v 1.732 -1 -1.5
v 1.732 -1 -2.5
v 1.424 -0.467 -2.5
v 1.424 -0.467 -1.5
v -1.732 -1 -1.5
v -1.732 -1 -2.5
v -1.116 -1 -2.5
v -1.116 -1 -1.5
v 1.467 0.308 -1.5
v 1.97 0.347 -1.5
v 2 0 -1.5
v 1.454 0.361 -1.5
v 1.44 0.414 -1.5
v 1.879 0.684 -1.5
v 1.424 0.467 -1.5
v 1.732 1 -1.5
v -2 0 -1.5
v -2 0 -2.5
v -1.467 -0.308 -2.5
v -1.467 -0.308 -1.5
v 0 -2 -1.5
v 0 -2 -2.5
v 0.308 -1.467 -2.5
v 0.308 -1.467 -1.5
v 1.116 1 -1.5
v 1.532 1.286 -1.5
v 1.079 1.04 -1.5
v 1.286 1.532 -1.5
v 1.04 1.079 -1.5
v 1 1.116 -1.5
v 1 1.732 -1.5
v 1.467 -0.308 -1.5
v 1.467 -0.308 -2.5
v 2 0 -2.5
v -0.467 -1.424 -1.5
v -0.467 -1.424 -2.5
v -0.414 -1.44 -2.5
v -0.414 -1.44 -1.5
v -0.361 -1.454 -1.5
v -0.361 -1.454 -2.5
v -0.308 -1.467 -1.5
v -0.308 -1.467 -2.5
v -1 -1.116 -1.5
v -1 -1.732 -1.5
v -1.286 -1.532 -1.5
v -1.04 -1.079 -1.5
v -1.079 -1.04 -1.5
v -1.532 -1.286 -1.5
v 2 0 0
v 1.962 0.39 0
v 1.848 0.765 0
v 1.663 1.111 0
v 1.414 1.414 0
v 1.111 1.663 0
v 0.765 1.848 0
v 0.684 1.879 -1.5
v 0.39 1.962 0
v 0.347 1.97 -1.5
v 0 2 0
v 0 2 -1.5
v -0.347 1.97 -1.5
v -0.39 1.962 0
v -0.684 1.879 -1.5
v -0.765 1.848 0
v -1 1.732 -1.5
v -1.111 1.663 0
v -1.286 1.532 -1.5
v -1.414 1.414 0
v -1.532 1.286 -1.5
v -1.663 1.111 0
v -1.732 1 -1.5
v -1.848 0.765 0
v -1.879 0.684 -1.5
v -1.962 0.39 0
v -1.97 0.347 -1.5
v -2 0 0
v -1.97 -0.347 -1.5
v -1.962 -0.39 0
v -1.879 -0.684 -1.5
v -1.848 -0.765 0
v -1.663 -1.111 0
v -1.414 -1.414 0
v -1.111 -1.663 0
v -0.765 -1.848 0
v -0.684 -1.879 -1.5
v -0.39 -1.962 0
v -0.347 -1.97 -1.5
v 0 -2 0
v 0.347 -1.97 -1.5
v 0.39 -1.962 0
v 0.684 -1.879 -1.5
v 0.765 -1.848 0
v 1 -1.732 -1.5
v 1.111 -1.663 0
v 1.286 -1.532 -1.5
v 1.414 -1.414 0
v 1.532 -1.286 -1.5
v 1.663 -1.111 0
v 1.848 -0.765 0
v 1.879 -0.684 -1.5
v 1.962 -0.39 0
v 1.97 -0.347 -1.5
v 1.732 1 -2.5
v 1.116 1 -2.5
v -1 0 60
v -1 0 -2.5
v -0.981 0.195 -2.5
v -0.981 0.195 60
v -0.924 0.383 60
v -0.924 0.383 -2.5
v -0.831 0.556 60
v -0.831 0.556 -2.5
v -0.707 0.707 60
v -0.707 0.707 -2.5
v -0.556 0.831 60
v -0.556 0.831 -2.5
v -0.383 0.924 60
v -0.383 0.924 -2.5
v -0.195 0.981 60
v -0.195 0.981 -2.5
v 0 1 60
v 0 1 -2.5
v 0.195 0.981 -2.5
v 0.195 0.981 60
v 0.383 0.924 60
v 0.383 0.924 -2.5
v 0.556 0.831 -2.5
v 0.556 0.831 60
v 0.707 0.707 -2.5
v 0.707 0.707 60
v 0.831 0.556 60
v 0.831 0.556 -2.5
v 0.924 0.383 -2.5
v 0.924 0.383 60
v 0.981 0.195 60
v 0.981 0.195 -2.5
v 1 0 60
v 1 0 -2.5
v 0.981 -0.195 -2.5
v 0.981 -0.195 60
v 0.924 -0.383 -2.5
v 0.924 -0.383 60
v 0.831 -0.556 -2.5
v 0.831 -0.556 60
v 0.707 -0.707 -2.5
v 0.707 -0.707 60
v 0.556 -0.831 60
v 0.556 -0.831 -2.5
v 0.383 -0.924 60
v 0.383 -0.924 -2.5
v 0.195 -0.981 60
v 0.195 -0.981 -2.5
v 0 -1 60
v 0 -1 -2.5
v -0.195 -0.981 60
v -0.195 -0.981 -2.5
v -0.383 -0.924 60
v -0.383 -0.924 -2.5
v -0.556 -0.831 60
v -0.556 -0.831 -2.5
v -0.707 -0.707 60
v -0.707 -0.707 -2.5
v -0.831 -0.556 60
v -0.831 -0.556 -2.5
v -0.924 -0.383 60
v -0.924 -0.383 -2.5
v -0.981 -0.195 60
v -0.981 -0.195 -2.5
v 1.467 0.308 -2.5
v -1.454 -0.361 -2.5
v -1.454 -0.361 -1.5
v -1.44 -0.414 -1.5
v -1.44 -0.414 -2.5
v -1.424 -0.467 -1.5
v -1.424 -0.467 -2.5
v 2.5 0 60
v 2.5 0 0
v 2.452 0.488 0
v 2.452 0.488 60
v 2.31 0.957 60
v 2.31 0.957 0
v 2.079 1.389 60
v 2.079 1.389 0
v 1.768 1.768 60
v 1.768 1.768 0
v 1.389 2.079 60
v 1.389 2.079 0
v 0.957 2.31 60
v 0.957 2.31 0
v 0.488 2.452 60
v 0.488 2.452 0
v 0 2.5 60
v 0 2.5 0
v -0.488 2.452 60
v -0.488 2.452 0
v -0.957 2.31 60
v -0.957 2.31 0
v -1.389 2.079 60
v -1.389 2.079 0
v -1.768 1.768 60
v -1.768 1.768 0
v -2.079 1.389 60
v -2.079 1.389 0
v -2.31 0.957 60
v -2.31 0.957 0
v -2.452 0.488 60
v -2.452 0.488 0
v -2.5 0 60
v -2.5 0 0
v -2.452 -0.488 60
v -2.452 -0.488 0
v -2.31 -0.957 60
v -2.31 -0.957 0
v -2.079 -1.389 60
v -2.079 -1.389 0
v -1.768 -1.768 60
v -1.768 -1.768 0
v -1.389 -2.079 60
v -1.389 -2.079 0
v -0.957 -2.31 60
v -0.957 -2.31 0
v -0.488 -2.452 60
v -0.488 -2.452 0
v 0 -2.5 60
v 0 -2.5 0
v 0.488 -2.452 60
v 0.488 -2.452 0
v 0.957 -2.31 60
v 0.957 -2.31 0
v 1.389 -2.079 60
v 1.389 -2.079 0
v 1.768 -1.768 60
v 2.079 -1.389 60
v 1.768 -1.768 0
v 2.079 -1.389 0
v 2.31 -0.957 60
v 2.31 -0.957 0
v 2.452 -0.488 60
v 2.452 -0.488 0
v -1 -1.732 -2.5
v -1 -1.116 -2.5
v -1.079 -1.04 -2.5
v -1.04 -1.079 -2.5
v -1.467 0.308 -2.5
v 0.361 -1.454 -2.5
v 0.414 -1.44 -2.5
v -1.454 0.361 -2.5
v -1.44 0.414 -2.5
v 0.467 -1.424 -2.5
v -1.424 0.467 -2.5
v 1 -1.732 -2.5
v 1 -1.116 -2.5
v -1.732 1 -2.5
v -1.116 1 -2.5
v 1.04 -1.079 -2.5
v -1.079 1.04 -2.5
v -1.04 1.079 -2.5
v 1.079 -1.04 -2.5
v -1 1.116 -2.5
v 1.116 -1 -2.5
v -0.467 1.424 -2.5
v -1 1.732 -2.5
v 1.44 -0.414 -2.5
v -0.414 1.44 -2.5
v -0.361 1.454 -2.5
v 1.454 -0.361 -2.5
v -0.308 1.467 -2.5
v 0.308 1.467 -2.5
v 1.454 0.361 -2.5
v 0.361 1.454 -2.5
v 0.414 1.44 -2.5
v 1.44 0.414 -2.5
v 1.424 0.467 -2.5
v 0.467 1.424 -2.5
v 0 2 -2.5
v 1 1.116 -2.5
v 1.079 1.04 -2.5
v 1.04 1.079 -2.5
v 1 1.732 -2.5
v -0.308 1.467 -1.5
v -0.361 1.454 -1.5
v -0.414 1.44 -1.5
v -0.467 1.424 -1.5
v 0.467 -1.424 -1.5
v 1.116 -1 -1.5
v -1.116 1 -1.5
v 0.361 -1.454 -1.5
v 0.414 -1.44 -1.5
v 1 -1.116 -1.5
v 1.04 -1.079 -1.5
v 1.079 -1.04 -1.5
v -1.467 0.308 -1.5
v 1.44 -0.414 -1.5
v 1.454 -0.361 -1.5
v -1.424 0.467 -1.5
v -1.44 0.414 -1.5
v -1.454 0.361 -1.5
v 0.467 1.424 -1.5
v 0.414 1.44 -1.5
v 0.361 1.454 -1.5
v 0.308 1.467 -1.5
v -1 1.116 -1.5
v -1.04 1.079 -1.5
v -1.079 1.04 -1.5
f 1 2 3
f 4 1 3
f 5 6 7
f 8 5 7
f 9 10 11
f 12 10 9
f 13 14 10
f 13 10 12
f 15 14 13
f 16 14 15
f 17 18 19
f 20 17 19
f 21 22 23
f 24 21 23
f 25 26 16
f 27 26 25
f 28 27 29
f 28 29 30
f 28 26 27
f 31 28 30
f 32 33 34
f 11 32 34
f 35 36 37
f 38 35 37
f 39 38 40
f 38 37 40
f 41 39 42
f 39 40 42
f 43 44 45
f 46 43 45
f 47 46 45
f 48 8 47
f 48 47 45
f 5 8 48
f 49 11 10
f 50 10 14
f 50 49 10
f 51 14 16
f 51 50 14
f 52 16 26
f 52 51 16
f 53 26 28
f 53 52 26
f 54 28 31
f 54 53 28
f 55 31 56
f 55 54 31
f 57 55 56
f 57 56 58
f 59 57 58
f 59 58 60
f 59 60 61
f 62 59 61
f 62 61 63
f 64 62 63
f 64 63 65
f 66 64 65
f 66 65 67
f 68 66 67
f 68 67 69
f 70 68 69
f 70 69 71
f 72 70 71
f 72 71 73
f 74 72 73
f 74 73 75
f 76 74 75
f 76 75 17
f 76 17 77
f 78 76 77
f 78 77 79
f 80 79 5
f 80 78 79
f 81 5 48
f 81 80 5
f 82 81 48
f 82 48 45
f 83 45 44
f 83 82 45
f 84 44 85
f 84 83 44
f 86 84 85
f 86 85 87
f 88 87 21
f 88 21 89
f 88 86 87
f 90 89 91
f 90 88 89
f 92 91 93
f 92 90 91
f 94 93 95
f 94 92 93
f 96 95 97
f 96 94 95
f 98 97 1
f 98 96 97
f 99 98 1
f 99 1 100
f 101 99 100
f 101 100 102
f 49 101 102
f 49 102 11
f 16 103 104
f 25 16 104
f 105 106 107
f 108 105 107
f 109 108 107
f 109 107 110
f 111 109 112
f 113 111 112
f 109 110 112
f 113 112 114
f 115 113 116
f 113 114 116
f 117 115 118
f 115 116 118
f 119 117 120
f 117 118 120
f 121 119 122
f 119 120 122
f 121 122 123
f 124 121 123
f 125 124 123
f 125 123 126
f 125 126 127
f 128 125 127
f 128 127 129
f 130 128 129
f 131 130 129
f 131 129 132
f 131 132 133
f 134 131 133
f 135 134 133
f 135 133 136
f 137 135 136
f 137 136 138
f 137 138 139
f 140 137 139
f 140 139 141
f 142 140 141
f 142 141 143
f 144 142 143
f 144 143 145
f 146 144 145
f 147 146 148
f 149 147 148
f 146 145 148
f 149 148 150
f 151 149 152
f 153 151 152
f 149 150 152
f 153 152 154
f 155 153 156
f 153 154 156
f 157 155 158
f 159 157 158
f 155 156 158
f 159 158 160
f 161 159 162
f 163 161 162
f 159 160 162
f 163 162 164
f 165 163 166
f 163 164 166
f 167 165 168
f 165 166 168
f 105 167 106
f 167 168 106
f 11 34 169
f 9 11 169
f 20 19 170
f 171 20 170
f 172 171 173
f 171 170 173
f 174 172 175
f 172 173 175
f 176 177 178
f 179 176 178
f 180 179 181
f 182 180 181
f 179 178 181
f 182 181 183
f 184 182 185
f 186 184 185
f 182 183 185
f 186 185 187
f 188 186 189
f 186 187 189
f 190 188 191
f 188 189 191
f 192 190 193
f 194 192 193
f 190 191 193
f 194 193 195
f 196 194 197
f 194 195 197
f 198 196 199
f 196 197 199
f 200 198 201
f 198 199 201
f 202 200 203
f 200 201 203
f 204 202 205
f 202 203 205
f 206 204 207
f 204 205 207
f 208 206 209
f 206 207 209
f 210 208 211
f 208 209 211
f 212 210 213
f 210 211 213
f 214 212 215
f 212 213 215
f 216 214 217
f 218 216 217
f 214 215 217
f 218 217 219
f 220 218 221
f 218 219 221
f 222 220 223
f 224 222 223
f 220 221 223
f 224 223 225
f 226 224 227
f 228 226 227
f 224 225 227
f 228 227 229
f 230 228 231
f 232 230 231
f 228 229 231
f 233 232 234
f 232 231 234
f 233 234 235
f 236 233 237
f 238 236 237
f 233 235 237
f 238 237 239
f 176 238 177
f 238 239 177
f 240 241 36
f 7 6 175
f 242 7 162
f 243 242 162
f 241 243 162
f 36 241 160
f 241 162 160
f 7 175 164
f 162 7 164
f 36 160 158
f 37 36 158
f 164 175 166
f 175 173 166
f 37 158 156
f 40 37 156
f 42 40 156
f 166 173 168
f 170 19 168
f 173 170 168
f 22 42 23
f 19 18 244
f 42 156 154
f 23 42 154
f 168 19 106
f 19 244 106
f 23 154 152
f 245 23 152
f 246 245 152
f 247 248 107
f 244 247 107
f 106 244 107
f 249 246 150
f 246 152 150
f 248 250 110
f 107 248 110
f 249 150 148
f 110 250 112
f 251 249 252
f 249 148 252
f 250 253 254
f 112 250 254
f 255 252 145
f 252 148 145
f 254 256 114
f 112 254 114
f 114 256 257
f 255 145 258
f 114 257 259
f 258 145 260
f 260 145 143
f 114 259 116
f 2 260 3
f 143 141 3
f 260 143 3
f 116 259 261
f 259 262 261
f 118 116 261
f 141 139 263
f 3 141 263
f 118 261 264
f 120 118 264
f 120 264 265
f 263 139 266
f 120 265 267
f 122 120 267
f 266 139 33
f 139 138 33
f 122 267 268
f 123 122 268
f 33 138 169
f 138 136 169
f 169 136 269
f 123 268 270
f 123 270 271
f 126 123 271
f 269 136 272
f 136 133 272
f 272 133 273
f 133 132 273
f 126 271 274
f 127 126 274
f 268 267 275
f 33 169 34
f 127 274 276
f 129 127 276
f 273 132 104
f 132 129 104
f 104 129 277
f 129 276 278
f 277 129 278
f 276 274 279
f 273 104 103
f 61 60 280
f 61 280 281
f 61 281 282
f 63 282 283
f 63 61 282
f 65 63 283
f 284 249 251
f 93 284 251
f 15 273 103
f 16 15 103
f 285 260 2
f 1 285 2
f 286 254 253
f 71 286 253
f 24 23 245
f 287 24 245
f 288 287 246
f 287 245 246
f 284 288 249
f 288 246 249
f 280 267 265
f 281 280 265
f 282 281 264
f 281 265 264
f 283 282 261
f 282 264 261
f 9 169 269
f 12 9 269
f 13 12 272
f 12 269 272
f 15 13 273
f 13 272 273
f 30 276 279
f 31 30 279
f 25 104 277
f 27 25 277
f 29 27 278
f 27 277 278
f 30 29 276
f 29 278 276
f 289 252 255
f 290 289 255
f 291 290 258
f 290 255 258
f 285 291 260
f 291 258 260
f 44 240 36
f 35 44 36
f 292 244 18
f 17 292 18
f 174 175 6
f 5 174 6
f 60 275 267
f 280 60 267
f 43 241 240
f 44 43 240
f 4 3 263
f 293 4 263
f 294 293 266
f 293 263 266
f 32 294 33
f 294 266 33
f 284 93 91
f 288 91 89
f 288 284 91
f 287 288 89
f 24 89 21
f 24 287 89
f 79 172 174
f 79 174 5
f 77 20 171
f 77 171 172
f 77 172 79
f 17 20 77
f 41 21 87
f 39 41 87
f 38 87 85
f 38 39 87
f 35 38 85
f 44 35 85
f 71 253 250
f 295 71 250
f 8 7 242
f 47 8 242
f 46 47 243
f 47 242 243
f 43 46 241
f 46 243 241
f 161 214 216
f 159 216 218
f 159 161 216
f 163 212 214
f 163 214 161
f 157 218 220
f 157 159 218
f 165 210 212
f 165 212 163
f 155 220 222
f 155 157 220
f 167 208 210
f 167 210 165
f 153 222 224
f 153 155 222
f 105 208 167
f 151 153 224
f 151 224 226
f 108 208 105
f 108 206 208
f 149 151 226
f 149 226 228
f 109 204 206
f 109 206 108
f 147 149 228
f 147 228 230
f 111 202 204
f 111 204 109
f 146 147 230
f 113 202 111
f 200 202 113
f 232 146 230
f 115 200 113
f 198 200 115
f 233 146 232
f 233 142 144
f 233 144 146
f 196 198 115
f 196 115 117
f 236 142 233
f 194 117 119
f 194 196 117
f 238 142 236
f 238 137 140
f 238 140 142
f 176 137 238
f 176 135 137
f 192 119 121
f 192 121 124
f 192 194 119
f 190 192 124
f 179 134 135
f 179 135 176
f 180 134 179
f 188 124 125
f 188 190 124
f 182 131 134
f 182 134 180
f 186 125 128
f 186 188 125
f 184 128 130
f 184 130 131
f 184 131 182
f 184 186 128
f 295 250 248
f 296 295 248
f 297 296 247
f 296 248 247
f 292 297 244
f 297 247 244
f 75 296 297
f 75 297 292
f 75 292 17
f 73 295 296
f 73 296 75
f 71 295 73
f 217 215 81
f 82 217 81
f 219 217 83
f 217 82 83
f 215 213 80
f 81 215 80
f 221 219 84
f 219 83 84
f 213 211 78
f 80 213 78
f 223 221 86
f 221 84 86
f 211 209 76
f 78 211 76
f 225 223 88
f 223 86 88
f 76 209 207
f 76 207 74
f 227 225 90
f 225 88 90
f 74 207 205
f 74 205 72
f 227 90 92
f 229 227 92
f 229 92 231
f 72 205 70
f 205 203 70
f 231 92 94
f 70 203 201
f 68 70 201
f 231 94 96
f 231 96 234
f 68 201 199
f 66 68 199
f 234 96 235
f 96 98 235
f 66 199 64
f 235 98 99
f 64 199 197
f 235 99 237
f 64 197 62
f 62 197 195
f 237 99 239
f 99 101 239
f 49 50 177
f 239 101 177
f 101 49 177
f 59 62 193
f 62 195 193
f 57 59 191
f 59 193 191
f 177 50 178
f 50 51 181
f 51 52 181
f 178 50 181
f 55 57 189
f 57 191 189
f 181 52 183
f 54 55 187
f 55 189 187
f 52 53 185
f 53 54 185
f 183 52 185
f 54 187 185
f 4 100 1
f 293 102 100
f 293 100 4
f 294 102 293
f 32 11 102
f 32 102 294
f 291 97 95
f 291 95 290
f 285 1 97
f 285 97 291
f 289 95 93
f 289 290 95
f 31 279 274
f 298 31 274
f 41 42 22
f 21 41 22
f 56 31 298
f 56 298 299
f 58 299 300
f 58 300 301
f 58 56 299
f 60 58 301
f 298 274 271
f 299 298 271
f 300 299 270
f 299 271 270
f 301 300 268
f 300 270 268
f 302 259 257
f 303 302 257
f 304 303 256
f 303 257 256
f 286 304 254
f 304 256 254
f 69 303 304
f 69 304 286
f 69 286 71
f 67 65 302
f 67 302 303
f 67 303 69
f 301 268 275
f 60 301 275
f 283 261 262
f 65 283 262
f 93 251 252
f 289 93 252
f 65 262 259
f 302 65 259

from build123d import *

# Parameters (mm, degrees)
IZIM1_R                     = 2.5
Y_KSEKLIK_EKSTR_ZYON1_DEPTH = 60
IZIM2_R                     = 2
Y_KSEKLIK_EKSTR_ZYON2_DEPTH = 2.5
KES_EKSTR_ZYON1_DEPTH       = 1
IZIM5_R                     = 1
KES_EKSTR_ZYON2_DEPTH       = 71


with BuildPart() as part:
    # Çizim1 → Yükseklik-Ekstrüzyon1 (new body)
    with BuildSketch(Plane.XY):
        Circle(IZIM1_R)
    extrude(amount=Y_KSEKLIK_EKSTR_ZYON1_DEPTH)

    # Çizim2 → Yükseklik-Ekstrüzyon2 (add)
    with BuildSketch(Plane.XY):
        Circle(IZIM2_R)
    extrude(amount=-Y_KSEKLIK_EKSTR_ZYON2_DEPTH)

    # Çizim4 → Kes-Ekstrüzyon1 (cut)
    with BuildSketch(Plane(origin=(0, 0, -2.5), x_dir=(-1, 0, 0), z_dir=(0, 0, -1))):
        with BuildLine():
            Line((-1.116104082, -1), (-1.732050808, -1))
            ThreePointArc((-1.732050808, -1), (-1.414213562, -1.414213562), (-1, -1.732050808))
            Line((-1, -1.732050808), (-1, -1.116104082))
            ThreePointArc((-1, -1.116104082), (-1.059643412, -1.059643412), (-1.116104082, -1))
        make_face()
        with BuildLine():
            Line((-0.466574488, -1.424077445), (-1, -1.732050808))
            ThreePointArc((-1, -1.732050808), (-0.51763809, -1.931851653), (0, -2))
            Line((0, -2), (-0.307973363, -1.466574488))
            ThreePointArc((-0.307973363, -1.466574488), (-0.387856408, -1.44749982), (-0.466574488, -1.424077445))
        make_face()
        with BuildLine():
            Line((0.307973363, -1.466574488), (0, -2))
            ThreePointArc((0, -2), (0.51763809, -1.931851653), (1, -1.732050808))
            Line((1, -1.732050808), (0.466574488, -1.424077445))
            ThreePointArc((0.466574488, -1.424077445), (0.387856408, -1.44749982), (0.307973363, -1.466574488))
        make_face()
        with BuildLine():
            Line((1, -1.116104082), (1, -1.732050808))
            ThreePointArc((1, -1.732050808), (1.414213562, -1.414213562), (1.732050808, -1))
            Line((1.732050808, -1), (1.116104082, -1))
            ThreePointArc((1.116104082, -1), (1.059643412, -1.059643412), (1, -1.116104082))
        make_face()
        with BuildLine():
            ThreePointArc((1.732050808, -1), (1.931851653, -0.51763809), (2, 0))
            Line((2, 0), (1.466574488, -0.307973363))
            ThreePointArc((1.466574488, -0.307973363), (1.44749982, -0.387856408), (1.424077445, -0.466574488))
            Line((1.424077445, -0.466574488), (1.732050808, -1))
        make_face()
        with BuildLine():
            ThreePointArc((2, 0), (1.931851653, 0.51763809), (1.732050808, 1))
            Line((1.732050808, 1), (1.424077445, 0.466574488))
            ThreePointArc((1.424077445, 0.466574488), (1.44749982, 0.387856408), (1.466574488, 0.307973363))
            Line((1.466574488, 0.307973363), (2, 0))
        make_face()
        with BuildLine():
            ThreePointArc((1.732050808, 1), (1.414213562, 1.414213562), (1, 1.732050808))
            Line((1, 1.732050808), (1, 1.116104082))
            ThreePointArc((1, 1.116104082), (1.059643412, 1.059643412), (1.116104082, 1))
            Line((1.116104082, 1), (1.732050808, 1))
        make_face()
        with BuildLine():
            ThreePointArc((1, 1.732050808), (0.51763809, 1.931851653), (0, 2))
            Line((0, 2), (0.307973363, 1.466574488))
            ThreePointArc((0.307973363, 1.466574488), (0.387856408, 1.44749982), (0.466574488, 1.424077445))
            Line((0.466574488, 1.424077445), (1, 1.732050808))
        make_face()
        with BuildLine():
            ThreePointArc((0, 2), (-0.51763809, 1.931851653), (-1, 1.732050808))
            Line((-1, 1.732050808), (-0.466574488, 1.424077445))
            ThreePointArc((-0.466574488, 1.424077445), (-0.387856408, 1.44749982), (-0.307973363, 1.466574488))
            Line((-0.307973363, 1.466574488), (0, 2))
        make_face()
        with BuildLine():
            ThreePointArc((-1, 1.732050808), (-1.414213562, 1.414213562), (-1.732050808, 1))
            Line((-1.732050808, 1), (-1.116104082, 1))
            ThreePointArc((-1.116104082, 1), (-1.059643412, 1.059643412), (-1, 1.116104082))
            Line((-1, 1.116104082), (-1, 1.732050808))
        make_face()
        with BuildLine():
            Line((-1.424077445, 0.466574488), (-1.732050808, 1))
            ThreePointArc((-1.732050808, 1), (-1.931851653, 0.51763809), (-2, 0))
            Line((-2, 0), (-1.466574488, 0.307973363))
            ThreePointArc((-1.466574488, 0.307973363), (-1.44749982, 0.387856408), (-1.424077445, 0.466574488))
        make_face()
        with BuildLine():
            Line((-1.466574488, -0.307973363), (-2, 0))
            ThreePointArc((-2, 0), (-1.931851653, -0.51763809), (-1.732050808, -1))
            Line((-1.732050808, -1), (-1.424077445, -0.466574488))
            ThreePointArc((-1.424077445, -0.466574488), (-1.44749982, -0.387856408), (-1.466574488, -0.307973363))
        make_face()
    extrude(amount=-KES_EKSTR_ZYON1_DEPTH, mode=Mode.SUBTRACT)

    # Çizim5 → Kes-Ekstrüzyon2 (cut)
    with BuildSketch(Plane(origin=(0, 0, -2.5), x_dir=(-1, 0, 0), z_dir=(0, 0, -1))):
        Circle(IZIM5_R)
    extrude(amount=-KES_EKSTR_ZYON2_DEPTH, mode=Mode.SUBTRACT)


solid = part.part
